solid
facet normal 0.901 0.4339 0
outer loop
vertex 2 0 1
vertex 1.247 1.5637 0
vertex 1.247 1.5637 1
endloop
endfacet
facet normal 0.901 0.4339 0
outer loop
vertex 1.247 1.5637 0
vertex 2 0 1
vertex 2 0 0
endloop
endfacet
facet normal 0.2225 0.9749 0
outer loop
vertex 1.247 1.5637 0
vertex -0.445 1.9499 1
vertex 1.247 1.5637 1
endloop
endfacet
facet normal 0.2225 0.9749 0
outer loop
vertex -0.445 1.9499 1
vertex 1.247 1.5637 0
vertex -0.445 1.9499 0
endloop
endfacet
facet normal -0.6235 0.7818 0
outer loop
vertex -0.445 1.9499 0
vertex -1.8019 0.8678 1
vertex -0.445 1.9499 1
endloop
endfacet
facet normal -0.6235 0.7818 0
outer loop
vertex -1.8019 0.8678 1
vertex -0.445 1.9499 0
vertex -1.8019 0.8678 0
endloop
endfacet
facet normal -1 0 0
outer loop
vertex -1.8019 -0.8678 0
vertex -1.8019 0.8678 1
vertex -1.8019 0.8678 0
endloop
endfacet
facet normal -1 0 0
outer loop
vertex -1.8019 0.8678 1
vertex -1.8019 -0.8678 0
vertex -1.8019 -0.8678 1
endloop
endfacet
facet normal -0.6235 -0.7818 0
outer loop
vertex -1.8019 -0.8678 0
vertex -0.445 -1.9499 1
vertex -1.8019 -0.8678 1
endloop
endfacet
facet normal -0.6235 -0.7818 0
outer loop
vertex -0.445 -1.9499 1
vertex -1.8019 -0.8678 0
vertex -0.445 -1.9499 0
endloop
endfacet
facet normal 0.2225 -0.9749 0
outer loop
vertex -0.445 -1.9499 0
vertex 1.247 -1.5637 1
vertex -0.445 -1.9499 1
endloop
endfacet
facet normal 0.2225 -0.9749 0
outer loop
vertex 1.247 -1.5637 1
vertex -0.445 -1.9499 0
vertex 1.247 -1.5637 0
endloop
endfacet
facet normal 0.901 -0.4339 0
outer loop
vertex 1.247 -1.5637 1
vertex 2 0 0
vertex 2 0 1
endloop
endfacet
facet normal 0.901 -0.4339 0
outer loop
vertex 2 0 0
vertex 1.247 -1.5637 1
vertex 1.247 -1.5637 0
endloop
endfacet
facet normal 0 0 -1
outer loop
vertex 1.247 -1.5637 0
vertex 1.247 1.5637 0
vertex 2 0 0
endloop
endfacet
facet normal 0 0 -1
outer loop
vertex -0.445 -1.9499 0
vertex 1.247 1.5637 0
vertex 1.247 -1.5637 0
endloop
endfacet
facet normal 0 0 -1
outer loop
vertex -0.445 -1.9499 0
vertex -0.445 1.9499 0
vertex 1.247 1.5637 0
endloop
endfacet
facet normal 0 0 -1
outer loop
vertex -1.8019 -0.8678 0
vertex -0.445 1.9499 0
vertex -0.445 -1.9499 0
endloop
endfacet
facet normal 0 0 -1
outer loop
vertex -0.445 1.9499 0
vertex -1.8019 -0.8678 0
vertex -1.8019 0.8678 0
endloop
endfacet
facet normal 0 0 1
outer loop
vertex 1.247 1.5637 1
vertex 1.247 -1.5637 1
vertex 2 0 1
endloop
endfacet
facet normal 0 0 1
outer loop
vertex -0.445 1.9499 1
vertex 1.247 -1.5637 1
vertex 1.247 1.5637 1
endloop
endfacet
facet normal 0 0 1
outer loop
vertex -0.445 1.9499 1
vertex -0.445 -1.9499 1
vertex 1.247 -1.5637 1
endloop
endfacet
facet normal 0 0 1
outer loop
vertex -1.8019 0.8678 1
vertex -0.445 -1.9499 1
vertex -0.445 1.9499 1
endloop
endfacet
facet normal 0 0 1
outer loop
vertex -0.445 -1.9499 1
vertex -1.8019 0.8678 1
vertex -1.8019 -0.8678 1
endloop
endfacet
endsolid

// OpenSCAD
use_minkowski = true;
cylinder_faces = 100;

%rounded_box(10,10,10, 2);
cylinder(r = 2, h = 1);

module rounded_box(length, width, height, r) {

    if (use_minkowski) {
        
        minkowski() {

            cylinder(r = r, h = 1);

            cube(size=[ length - (r * 2.0),
                        width - (r * 2.0),
                        height - 1 ], center = false);

        }
        
    } else {
        
        hull() {
            translate([r,r,0]) cylinder(r = r, h = height, $fn = cylinder_faces);
            translate([length-r,r,0]) cylinder(r = r, h = height, $fn = cylinder_faces);
            translate([length-r,width-r,0]) cylinder(r = r, h = height, $fn = cylinder_faces);
            translate([r,width-r,0]) cylinder(r = r, h = height, $fn = cylinder_faces);
        }
    }

}
